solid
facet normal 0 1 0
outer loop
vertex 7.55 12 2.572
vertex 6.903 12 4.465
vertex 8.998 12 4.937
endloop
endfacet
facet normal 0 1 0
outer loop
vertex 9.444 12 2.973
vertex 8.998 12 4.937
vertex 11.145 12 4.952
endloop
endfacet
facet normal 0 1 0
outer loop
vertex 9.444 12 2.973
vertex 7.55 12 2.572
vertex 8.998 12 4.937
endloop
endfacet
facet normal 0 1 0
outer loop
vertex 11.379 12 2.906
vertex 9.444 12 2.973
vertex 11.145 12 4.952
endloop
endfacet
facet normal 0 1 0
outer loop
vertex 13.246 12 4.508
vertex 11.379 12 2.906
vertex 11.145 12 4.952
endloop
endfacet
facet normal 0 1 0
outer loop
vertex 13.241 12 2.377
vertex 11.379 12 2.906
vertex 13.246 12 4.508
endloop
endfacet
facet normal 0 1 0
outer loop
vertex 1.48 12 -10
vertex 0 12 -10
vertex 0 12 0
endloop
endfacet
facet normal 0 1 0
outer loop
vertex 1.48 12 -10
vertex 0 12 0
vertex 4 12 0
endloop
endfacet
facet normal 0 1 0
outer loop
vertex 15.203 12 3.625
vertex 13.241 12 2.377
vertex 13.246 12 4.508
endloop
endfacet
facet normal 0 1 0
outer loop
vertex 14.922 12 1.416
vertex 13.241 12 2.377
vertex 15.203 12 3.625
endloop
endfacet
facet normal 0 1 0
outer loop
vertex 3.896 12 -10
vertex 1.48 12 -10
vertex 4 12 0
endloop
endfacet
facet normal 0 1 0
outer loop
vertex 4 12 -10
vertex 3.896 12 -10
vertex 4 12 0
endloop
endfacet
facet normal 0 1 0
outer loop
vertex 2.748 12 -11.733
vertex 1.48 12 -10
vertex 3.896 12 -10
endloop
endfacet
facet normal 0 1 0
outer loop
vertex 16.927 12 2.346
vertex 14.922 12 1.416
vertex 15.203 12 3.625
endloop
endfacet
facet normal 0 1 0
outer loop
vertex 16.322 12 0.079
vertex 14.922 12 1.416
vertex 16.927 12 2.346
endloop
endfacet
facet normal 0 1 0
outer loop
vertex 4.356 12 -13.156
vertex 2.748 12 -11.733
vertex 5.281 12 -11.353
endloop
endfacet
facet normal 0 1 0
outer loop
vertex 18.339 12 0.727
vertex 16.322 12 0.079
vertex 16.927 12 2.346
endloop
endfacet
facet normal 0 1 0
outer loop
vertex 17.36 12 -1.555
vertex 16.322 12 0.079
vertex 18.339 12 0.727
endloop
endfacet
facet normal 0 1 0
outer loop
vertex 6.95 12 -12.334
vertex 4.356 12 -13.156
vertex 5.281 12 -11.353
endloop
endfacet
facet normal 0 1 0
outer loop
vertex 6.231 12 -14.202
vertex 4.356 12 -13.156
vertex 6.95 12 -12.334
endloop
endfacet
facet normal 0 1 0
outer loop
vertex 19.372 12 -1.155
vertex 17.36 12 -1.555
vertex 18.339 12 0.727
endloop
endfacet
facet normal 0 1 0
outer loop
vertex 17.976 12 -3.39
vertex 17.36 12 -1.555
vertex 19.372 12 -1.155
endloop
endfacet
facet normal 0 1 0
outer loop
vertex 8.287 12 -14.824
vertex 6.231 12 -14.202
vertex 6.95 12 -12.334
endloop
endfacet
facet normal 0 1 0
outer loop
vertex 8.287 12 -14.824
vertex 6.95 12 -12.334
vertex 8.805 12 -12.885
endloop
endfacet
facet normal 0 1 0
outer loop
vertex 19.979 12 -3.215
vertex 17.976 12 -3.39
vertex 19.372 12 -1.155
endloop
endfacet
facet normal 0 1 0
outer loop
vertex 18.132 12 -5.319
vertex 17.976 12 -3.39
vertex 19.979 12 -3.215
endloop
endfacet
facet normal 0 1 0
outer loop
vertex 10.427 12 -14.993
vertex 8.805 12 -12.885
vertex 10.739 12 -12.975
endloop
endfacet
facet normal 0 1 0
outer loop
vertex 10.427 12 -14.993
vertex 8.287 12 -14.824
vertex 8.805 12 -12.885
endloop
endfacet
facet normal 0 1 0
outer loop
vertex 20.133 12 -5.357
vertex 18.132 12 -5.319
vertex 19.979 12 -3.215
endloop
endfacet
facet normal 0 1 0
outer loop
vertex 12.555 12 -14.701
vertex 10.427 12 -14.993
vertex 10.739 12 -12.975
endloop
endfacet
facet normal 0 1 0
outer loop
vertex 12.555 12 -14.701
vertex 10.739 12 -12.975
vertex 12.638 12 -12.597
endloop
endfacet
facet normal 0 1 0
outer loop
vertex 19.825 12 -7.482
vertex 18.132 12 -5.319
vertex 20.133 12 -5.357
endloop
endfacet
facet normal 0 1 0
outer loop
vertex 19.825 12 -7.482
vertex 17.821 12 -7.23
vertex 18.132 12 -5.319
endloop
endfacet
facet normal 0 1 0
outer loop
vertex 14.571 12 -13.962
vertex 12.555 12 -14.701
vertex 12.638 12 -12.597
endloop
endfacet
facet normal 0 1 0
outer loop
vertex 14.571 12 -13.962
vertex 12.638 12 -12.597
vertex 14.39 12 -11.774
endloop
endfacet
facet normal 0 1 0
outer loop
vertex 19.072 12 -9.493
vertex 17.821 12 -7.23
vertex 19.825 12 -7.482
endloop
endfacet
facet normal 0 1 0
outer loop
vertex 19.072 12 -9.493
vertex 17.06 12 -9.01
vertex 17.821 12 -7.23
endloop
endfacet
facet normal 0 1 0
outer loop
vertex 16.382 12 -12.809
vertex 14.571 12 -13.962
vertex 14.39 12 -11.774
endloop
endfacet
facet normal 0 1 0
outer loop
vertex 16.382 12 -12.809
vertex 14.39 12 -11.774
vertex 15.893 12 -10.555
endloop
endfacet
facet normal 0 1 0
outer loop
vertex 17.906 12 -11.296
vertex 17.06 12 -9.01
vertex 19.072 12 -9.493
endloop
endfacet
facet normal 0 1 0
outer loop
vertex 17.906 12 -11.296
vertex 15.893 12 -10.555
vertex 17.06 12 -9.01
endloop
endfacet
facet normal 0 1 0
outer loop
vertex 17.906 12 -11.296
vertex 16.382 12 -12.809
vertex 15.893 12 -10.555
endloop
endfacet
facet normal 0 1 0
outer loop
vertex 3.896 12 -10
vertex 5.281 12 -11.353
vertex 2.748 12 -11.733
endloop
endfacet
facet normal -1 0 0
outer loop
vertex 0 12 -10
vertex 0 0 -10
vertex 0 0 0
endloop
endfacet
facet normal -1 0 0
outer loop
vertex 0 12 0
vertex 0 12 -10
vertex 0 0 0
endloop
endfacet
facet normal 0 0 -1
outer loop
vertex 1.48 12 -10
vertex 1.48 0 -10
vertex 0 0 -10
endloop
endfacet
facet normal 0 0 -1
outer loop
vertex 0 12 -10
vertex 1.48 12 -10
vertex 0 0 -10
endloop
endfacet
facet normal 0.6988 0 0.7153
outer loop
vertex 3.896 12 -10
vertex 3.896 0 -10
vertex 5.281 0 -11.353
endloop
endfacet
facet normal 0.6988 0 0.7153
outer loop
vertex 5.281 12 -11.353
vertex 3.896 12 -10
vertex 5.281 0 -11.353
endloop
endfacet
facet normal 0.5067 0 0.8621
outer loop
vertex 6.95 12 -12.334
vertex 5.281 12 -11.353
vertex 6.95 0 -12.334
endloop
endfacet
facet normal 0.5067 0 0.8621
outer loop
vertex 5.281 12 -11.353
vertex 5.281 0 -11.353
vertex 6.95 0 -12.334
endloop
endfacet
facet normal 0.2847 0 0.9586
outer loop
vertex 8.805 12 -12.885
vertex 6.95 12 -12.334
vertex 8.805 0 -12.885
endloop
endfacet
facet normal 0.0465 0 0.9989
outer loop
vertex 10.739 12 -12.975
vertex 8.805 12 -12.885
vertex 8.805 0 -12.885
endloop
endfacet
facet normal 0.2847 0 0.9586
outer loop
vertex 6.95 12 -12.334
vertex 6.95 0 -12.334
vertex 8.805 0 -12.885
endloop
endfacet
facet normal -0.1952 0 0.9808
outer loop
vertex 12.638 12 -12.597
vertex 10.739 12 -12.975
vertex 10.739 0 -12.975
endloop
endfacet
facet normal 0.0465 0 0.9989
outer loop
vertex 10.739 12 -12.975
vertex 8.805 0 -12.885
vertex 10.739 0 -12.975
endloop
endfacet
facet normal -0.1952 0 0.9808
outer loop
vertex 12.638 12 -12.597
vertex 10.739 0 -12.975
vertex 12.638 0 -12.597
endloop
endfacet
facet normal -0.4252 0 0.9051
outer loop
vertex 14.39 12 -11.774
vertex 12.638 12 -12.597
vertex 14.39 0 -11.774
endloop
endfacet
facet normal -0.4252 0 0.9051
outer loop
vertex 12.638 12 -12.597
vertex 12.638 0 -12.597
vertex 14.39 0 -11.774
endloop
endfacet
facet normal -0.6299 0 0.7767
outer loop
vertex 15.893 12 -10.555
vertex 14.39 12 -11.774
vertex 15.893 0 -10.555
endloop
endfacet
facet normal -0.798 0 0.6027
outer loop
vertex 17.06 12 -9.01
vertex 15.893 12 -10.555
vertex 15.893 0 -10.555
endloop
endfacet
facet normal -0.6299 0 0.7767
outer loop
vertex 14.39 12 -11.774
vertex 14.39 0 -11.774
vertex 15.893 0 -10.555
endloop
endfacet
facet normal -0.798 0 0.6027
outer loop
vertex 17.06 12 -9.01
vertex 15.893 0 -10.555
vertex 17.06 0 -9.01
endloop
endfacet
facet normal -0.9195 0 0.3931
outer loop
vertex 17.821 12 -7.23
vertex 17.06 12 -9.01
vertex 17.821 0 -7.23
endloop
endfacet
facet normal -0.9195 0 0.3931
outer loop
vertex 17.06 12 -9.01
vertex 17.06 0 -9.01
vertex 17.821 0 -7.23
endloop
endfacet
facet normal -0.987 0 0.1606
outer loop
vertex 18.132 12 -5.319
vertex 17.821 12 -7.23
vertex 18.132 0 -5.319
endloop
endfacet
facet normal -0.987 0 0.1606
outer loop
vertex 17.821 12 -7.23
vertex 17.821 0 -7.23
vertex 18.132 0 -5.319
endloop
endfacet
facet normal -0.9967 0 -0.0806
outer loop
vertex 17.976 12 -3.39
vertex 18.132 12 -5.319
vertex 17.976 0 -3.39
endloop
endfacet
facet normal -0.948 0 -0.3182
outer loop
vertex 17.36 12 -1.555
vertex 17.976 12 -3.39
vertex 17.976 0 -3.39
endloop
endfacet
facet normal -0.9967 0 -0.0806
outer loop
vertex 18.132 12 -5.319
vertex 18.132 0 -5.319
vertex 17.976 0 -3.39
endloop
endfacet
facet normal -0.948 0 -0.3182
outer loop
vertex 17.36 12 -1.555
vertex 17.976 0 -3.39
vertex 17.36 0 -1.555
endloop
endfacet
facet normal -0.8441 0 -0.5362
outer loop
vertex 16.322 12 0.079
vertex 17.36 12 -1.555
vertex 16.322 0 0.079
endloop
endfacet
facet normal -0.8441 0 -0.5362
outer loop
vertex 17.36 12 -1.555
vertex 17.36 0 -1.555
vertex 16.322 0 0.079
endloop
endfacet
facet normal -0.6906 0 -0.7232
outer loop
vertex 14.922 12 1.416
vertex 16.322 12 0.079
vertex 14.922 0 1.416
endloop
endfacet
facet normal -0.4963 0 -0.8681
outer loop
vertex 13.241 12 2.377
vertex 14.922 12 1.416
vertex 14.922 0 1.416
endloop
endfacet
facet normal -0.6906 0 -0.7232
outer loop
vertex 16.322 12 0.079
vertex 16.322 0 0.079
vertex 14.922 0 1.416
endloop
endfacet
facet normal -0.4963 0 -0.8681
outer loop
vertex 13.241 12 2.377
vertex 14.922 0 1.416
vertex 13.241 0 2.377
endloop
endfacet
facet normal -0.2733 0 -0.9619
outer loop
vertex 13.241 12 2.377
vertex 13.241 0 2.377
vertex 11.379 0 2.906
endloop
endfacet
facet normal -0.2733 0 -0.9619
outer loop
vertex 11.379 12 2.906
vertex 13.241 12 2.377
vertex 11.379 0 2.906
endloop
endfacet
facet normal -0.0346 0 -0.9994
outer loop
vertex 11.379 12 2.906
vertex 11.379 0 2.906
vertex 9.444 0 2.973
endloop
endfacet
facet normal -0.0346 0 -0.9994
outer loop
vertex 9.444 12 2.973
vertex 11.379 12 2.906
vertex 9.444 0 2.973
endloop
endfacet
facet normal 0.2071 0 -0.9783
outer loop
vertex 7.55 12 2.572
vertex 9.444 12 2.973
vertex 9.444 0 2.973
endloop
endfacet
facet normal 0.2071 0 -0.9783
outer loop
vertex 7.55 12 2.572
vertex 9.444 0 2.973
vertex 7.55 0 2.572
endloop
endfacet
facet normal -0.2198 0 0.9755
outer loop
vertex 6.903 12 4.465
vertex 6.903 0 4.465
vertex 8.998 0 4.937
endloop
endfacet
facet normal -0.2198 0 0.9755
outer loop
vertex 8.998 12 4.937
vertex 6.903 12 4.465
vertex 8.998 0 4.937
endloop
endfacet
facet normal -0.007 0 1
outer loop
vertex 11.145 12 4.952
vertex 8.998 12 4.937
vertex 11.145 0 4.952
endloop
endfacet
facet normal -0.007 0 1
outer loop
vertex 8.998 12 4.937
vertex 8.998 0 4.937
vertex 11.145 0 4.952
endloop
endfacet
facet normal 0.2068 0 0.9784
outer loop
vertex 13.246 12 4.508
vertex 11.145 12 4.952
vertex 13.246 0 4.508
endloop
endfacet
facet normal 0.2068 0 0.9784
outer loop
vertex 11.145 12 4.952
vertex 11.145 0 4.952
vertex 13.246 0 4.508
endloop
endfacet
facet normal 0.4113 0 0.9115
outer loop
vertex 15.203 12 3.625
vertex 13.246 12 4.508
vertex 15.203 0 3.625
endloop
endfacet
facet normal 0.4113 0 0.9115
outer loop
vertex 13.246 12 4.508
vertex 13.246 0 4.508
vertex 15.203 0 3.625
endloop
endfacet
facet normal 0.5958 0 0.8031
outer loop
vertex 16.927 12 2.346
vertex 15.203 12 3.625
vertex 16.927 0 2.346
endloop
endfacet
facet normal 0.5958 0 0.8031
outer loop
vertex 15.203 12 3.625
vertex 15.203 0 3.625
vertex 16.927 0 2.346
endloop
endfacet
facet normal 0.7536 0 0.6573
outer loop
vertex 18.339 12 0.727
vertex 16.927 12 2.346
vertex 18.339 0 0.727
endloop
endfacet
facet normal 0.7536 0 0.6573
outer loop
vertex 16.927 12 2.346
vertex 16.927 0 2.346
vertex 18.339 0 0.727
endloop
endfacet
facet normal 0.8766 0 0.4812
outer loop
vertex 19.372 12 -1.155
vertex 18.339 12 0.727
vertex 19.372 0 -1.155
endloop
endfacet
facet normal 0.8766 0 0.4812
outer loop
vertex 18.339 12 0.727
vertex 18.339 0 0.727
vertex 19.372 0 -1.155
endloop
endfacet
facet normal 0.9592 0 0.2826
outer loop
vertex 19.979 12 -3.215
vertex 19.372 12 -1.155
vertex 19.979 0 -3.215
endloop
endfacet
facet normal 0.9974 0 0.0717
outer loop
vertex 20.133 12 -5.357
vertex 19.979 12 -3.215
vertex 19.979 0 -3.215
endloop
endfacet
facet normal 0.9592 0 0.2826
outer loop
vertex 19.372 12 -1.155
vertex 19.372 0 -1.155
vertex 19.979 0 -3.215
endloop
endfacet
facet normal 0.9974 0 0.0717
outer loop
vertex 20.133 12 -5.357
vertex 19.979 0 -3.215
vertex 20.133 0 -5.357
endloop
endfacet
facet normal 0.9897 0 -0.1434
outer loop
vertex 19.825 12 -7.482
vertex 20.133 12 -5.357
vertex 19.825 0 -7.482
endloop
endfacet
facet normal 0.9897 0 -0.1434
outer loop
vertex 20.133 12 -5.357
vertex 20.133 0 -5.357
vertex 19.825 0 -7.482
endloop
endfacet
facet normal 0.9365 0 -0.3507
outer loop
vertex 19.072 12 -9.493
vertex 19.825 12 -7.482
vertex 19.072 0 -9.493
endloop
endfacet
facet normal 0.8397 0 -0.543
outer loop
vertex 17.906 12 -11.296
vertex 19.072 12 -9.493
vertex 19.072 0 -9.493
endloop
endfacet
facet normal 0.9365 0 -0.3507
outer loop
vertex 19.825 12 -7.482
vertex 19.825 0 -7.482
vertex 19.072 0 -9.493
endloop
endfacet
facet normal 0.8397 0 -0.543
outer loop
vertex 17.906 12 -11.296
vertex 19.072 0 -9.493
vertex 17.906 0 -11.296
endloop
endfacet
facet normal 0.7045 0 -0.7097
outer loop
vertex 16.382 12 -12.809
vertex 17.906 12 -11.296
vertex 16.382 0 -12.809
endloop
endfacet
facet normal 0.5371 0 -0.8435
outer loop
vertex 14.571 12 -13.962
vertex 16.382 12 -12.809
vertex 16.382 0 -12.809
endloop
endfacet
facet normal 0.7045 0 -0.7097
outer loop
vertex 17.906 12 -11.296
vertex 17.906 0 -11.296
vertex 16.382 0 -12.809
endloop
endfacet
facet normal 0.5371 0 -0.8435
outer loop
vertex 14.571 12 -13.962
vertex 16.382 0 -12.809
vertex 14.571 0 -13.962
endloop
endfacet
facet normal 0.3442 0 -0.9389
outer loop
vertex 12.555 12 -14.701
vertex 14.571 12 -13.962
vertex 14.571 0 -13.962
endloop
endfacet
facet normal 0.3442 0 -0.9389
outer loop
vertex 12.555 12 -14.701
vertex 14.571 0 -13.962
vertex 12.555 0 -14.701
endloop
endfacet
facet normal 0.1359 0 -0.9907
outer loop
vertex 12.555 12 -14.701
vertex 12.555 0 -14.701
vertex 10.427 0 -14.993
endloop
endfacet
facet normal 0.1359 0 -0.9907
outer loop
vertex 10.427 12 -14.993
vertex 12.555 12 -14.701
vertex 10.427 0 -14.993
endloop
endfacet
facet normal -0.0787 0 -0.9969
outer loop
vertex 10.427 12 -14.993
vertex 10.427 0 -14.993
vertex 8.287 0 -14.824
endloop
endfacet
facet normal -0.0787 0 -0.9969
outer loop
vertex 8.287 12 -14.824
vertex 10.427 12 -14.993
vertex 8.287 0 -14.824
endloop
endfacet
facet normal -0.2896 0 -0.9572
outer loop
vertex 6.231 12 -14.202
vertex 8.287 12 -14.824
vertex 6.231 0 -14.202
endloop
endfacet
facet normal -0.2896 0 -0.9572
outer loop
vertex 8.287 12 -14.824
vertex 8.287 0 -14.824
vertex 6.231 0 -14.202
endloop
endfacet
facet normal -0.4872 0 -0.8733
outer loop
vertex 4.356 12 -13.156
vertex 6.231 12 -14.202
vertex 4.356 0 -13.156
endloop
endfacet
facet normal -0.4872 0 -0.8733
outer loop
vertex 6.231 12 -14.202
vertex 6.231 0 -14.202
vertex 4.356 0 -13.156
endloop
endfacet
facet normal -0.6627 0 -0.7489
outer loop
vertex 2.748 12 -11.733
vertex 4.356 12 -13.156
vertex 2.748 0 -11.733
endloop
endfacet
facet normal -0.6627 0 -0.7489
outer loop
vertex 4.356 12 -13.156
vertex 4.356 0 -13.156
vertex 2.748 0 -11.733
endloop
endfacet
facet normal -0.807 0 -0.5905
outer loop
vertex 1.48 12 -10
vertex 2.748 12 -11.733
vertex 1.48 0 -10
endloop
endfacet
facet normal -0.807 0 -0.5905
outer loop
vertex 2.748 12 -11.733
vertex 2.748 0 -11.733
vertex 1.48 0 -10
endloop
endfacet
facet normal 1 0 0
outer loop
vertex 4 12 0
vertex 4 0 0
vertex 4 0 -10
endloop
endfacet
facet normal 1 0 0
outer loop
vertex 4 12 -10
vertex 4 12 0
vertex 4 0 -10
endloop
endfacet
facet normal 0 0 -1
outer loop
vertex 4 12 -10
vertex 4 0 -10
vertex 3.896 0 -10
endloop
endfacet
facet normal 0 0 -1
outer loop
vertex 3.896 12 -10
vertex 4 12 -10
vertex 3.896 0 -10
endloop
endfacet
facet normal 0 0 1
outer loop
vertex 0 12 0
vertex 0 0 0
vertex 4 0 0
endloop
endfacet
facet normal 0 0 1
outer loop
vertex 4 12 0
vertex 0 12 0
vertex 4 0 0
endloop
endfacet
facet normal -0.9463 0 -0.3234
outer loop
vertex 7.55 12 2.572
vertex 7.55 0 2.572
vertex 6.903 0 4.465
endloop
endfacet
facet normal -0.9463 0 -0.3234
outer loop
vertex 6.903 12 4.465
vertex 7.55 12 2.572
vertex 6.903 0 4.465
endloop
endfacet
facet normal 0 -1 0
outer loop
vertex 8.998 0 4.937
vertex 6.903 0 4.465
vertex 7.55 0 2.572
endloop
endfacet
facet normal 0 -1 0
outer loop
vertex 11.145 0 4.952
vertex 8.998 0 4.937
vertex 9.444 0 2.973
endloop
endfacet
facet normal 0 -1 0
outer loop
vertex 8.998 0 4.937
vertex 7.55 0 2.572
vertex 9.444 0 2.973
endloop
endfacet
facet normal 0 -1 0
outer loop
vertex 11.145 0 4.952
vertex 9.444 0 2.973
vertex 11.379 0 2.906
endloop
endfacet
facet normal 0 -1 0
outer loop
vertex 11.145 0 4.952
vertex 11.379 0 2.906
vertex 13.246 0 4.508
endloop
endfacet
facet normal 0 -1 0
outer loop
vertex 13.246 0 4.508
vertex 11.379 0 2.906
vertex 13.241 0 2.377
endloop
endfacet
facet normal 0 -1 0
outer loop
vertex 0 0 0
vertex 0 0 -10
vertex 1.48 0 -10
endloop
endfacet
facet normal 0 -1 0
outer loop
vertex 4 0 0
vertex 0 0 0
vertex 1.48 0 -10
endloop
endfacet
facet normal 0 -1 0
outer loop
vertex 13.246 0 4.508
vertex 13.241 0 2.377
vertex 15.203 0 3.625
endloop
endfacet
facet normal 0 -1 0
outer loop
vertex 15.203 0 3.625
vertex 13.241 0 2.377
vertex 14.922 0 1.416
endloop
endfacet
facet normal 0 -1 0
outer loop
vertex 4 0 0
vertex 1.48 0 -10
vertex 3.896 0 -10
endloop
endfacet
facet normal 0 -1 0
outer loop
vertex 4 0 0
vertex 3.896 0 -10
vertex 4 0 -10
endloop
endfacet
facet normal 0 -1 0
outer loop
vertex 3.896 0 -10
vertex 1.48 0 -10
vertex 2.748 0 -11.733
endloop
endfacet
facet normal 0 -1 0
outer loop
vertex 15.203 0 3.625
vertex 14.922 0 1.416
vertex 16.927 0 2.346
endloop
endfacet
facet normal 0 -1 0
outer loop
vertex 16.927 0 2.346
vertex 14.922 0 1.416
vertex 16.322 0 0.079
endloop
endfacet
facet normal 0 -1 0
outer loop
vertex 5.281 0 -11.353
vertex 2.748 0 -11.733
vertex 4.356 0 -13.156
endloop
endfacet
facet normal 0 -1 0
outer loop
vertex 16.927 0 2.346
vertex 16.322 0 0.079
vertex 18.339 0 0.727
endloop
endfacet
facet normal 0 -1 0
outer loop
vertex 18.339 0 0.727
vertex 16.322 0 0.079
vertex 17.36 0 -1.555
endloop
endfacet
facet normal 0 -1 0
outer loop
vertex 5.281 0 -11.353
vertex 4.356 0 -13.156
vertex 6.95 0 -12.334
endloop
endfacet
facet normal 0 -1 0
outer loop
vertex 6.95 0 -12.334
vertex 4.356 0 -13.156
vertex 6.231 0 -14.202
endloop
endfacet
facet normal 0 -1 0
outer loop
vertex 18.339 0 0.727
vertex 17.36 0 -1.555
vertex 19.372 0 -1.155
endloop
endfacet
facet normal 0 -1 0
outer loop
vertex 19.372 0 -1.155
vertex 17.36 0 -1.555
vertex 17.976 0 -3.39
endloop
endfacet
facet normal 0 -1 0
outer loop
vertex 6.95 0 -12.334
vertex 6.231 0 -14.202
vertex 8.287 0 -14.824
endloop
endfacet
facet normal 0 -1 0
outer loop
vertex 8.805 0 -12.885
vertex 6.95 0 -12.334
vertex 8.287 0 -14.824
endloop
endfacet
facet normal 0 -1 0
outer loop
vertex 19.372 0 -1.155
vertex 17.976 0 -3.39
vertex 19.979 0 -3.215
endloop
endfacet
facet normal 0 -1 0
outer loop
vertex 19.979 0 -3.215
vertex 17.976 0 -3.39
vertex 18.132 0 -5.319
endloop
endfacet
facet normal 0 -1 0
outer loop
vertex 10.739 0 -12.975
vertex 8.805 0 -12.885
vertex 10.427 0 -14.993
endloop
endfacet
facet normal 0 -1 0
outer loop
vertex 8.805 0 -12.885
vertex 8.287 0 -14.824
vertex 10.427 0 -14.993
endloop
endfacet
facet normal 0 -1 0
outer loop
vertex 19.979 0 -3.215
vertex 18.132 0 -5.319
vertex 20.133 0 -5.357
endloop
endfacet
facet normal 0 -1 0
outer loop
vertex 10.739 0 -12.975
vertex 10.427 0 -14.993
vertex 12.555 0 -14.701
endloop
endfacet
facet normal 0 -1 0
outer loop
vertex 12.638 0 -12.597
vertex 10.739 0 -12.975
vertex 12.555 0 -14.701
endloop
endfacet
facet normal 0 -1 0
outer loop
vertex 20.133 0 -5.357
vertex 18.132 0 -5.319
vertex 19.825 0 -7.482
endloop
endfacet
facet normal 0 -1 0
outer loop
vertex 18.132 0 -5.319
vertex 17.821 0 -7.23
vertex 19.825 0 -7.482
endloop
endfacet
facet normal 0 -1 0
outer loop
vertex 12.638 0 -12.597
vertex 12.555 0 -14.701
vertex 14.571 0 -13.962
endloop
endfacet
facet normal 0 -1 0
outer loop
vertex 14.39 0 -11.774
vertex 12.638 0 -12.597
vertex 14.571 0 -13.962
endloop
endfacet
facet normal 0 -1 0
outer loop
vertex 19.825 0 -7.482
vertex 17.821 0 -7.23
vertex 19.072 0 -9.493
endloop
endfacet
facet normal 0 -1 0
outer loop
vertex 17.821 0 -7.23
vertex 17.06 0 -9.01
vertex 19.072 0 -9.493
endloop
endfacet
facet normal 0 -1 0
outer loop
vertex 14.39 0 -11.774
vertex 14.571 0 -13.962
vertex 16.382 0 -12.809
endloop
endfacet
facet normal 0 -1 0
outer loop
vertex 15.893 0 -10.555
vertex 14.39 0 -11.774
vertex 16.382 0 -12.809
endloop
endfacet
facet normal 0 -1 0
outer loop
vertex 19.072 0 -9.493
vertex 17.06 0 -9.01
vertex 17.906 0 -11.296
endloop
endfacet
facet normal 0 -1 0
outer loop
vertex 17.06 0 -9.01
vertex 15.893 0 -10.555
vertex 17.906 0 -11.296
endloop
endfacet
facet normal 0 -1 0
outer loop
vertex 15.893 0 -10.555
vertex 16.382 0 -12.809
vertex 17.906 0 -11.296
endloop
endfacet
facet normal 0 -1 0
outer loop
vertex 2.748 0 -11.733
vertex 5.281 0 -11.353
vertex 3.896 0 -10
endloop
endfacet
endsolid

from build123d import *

# Parameters (mm, degrees)
BOSS_EXTRUDE1_DEPTH = 12


with BuildPart() as part:
    # Sketch1 → Boss-Extrude1 (new body)
    with BuildSketch(Plane(origin=(0, 0, 0), x_dir=(1, 0, 0), z_dir=(0, 1, 0))):
        with BuildLine():
            Line((7.550302589, -2.572347999), (6.903132735, -4.464746261))
            ThreePointArc((6.903132735, -4.464746261), (19.502585792, 8.507647316), (1.480319122, 10))
            Line((1.480319122, 10), (0, 10))
            Line((0, 10), (0, 0))
            Line((0, 0), (4, 0))
            Line((4, 0), (4, 10))
            Line((4, 10), (3.89619073, 10))
            ThreePointArc((3.89619073, 10), (17.821084722, 7.230023098), (7.550302589, -2.572347999))
        make_face()
    extrude(amount=BOSS_EXTRUDE1_DEPTH)


solid = part.part
